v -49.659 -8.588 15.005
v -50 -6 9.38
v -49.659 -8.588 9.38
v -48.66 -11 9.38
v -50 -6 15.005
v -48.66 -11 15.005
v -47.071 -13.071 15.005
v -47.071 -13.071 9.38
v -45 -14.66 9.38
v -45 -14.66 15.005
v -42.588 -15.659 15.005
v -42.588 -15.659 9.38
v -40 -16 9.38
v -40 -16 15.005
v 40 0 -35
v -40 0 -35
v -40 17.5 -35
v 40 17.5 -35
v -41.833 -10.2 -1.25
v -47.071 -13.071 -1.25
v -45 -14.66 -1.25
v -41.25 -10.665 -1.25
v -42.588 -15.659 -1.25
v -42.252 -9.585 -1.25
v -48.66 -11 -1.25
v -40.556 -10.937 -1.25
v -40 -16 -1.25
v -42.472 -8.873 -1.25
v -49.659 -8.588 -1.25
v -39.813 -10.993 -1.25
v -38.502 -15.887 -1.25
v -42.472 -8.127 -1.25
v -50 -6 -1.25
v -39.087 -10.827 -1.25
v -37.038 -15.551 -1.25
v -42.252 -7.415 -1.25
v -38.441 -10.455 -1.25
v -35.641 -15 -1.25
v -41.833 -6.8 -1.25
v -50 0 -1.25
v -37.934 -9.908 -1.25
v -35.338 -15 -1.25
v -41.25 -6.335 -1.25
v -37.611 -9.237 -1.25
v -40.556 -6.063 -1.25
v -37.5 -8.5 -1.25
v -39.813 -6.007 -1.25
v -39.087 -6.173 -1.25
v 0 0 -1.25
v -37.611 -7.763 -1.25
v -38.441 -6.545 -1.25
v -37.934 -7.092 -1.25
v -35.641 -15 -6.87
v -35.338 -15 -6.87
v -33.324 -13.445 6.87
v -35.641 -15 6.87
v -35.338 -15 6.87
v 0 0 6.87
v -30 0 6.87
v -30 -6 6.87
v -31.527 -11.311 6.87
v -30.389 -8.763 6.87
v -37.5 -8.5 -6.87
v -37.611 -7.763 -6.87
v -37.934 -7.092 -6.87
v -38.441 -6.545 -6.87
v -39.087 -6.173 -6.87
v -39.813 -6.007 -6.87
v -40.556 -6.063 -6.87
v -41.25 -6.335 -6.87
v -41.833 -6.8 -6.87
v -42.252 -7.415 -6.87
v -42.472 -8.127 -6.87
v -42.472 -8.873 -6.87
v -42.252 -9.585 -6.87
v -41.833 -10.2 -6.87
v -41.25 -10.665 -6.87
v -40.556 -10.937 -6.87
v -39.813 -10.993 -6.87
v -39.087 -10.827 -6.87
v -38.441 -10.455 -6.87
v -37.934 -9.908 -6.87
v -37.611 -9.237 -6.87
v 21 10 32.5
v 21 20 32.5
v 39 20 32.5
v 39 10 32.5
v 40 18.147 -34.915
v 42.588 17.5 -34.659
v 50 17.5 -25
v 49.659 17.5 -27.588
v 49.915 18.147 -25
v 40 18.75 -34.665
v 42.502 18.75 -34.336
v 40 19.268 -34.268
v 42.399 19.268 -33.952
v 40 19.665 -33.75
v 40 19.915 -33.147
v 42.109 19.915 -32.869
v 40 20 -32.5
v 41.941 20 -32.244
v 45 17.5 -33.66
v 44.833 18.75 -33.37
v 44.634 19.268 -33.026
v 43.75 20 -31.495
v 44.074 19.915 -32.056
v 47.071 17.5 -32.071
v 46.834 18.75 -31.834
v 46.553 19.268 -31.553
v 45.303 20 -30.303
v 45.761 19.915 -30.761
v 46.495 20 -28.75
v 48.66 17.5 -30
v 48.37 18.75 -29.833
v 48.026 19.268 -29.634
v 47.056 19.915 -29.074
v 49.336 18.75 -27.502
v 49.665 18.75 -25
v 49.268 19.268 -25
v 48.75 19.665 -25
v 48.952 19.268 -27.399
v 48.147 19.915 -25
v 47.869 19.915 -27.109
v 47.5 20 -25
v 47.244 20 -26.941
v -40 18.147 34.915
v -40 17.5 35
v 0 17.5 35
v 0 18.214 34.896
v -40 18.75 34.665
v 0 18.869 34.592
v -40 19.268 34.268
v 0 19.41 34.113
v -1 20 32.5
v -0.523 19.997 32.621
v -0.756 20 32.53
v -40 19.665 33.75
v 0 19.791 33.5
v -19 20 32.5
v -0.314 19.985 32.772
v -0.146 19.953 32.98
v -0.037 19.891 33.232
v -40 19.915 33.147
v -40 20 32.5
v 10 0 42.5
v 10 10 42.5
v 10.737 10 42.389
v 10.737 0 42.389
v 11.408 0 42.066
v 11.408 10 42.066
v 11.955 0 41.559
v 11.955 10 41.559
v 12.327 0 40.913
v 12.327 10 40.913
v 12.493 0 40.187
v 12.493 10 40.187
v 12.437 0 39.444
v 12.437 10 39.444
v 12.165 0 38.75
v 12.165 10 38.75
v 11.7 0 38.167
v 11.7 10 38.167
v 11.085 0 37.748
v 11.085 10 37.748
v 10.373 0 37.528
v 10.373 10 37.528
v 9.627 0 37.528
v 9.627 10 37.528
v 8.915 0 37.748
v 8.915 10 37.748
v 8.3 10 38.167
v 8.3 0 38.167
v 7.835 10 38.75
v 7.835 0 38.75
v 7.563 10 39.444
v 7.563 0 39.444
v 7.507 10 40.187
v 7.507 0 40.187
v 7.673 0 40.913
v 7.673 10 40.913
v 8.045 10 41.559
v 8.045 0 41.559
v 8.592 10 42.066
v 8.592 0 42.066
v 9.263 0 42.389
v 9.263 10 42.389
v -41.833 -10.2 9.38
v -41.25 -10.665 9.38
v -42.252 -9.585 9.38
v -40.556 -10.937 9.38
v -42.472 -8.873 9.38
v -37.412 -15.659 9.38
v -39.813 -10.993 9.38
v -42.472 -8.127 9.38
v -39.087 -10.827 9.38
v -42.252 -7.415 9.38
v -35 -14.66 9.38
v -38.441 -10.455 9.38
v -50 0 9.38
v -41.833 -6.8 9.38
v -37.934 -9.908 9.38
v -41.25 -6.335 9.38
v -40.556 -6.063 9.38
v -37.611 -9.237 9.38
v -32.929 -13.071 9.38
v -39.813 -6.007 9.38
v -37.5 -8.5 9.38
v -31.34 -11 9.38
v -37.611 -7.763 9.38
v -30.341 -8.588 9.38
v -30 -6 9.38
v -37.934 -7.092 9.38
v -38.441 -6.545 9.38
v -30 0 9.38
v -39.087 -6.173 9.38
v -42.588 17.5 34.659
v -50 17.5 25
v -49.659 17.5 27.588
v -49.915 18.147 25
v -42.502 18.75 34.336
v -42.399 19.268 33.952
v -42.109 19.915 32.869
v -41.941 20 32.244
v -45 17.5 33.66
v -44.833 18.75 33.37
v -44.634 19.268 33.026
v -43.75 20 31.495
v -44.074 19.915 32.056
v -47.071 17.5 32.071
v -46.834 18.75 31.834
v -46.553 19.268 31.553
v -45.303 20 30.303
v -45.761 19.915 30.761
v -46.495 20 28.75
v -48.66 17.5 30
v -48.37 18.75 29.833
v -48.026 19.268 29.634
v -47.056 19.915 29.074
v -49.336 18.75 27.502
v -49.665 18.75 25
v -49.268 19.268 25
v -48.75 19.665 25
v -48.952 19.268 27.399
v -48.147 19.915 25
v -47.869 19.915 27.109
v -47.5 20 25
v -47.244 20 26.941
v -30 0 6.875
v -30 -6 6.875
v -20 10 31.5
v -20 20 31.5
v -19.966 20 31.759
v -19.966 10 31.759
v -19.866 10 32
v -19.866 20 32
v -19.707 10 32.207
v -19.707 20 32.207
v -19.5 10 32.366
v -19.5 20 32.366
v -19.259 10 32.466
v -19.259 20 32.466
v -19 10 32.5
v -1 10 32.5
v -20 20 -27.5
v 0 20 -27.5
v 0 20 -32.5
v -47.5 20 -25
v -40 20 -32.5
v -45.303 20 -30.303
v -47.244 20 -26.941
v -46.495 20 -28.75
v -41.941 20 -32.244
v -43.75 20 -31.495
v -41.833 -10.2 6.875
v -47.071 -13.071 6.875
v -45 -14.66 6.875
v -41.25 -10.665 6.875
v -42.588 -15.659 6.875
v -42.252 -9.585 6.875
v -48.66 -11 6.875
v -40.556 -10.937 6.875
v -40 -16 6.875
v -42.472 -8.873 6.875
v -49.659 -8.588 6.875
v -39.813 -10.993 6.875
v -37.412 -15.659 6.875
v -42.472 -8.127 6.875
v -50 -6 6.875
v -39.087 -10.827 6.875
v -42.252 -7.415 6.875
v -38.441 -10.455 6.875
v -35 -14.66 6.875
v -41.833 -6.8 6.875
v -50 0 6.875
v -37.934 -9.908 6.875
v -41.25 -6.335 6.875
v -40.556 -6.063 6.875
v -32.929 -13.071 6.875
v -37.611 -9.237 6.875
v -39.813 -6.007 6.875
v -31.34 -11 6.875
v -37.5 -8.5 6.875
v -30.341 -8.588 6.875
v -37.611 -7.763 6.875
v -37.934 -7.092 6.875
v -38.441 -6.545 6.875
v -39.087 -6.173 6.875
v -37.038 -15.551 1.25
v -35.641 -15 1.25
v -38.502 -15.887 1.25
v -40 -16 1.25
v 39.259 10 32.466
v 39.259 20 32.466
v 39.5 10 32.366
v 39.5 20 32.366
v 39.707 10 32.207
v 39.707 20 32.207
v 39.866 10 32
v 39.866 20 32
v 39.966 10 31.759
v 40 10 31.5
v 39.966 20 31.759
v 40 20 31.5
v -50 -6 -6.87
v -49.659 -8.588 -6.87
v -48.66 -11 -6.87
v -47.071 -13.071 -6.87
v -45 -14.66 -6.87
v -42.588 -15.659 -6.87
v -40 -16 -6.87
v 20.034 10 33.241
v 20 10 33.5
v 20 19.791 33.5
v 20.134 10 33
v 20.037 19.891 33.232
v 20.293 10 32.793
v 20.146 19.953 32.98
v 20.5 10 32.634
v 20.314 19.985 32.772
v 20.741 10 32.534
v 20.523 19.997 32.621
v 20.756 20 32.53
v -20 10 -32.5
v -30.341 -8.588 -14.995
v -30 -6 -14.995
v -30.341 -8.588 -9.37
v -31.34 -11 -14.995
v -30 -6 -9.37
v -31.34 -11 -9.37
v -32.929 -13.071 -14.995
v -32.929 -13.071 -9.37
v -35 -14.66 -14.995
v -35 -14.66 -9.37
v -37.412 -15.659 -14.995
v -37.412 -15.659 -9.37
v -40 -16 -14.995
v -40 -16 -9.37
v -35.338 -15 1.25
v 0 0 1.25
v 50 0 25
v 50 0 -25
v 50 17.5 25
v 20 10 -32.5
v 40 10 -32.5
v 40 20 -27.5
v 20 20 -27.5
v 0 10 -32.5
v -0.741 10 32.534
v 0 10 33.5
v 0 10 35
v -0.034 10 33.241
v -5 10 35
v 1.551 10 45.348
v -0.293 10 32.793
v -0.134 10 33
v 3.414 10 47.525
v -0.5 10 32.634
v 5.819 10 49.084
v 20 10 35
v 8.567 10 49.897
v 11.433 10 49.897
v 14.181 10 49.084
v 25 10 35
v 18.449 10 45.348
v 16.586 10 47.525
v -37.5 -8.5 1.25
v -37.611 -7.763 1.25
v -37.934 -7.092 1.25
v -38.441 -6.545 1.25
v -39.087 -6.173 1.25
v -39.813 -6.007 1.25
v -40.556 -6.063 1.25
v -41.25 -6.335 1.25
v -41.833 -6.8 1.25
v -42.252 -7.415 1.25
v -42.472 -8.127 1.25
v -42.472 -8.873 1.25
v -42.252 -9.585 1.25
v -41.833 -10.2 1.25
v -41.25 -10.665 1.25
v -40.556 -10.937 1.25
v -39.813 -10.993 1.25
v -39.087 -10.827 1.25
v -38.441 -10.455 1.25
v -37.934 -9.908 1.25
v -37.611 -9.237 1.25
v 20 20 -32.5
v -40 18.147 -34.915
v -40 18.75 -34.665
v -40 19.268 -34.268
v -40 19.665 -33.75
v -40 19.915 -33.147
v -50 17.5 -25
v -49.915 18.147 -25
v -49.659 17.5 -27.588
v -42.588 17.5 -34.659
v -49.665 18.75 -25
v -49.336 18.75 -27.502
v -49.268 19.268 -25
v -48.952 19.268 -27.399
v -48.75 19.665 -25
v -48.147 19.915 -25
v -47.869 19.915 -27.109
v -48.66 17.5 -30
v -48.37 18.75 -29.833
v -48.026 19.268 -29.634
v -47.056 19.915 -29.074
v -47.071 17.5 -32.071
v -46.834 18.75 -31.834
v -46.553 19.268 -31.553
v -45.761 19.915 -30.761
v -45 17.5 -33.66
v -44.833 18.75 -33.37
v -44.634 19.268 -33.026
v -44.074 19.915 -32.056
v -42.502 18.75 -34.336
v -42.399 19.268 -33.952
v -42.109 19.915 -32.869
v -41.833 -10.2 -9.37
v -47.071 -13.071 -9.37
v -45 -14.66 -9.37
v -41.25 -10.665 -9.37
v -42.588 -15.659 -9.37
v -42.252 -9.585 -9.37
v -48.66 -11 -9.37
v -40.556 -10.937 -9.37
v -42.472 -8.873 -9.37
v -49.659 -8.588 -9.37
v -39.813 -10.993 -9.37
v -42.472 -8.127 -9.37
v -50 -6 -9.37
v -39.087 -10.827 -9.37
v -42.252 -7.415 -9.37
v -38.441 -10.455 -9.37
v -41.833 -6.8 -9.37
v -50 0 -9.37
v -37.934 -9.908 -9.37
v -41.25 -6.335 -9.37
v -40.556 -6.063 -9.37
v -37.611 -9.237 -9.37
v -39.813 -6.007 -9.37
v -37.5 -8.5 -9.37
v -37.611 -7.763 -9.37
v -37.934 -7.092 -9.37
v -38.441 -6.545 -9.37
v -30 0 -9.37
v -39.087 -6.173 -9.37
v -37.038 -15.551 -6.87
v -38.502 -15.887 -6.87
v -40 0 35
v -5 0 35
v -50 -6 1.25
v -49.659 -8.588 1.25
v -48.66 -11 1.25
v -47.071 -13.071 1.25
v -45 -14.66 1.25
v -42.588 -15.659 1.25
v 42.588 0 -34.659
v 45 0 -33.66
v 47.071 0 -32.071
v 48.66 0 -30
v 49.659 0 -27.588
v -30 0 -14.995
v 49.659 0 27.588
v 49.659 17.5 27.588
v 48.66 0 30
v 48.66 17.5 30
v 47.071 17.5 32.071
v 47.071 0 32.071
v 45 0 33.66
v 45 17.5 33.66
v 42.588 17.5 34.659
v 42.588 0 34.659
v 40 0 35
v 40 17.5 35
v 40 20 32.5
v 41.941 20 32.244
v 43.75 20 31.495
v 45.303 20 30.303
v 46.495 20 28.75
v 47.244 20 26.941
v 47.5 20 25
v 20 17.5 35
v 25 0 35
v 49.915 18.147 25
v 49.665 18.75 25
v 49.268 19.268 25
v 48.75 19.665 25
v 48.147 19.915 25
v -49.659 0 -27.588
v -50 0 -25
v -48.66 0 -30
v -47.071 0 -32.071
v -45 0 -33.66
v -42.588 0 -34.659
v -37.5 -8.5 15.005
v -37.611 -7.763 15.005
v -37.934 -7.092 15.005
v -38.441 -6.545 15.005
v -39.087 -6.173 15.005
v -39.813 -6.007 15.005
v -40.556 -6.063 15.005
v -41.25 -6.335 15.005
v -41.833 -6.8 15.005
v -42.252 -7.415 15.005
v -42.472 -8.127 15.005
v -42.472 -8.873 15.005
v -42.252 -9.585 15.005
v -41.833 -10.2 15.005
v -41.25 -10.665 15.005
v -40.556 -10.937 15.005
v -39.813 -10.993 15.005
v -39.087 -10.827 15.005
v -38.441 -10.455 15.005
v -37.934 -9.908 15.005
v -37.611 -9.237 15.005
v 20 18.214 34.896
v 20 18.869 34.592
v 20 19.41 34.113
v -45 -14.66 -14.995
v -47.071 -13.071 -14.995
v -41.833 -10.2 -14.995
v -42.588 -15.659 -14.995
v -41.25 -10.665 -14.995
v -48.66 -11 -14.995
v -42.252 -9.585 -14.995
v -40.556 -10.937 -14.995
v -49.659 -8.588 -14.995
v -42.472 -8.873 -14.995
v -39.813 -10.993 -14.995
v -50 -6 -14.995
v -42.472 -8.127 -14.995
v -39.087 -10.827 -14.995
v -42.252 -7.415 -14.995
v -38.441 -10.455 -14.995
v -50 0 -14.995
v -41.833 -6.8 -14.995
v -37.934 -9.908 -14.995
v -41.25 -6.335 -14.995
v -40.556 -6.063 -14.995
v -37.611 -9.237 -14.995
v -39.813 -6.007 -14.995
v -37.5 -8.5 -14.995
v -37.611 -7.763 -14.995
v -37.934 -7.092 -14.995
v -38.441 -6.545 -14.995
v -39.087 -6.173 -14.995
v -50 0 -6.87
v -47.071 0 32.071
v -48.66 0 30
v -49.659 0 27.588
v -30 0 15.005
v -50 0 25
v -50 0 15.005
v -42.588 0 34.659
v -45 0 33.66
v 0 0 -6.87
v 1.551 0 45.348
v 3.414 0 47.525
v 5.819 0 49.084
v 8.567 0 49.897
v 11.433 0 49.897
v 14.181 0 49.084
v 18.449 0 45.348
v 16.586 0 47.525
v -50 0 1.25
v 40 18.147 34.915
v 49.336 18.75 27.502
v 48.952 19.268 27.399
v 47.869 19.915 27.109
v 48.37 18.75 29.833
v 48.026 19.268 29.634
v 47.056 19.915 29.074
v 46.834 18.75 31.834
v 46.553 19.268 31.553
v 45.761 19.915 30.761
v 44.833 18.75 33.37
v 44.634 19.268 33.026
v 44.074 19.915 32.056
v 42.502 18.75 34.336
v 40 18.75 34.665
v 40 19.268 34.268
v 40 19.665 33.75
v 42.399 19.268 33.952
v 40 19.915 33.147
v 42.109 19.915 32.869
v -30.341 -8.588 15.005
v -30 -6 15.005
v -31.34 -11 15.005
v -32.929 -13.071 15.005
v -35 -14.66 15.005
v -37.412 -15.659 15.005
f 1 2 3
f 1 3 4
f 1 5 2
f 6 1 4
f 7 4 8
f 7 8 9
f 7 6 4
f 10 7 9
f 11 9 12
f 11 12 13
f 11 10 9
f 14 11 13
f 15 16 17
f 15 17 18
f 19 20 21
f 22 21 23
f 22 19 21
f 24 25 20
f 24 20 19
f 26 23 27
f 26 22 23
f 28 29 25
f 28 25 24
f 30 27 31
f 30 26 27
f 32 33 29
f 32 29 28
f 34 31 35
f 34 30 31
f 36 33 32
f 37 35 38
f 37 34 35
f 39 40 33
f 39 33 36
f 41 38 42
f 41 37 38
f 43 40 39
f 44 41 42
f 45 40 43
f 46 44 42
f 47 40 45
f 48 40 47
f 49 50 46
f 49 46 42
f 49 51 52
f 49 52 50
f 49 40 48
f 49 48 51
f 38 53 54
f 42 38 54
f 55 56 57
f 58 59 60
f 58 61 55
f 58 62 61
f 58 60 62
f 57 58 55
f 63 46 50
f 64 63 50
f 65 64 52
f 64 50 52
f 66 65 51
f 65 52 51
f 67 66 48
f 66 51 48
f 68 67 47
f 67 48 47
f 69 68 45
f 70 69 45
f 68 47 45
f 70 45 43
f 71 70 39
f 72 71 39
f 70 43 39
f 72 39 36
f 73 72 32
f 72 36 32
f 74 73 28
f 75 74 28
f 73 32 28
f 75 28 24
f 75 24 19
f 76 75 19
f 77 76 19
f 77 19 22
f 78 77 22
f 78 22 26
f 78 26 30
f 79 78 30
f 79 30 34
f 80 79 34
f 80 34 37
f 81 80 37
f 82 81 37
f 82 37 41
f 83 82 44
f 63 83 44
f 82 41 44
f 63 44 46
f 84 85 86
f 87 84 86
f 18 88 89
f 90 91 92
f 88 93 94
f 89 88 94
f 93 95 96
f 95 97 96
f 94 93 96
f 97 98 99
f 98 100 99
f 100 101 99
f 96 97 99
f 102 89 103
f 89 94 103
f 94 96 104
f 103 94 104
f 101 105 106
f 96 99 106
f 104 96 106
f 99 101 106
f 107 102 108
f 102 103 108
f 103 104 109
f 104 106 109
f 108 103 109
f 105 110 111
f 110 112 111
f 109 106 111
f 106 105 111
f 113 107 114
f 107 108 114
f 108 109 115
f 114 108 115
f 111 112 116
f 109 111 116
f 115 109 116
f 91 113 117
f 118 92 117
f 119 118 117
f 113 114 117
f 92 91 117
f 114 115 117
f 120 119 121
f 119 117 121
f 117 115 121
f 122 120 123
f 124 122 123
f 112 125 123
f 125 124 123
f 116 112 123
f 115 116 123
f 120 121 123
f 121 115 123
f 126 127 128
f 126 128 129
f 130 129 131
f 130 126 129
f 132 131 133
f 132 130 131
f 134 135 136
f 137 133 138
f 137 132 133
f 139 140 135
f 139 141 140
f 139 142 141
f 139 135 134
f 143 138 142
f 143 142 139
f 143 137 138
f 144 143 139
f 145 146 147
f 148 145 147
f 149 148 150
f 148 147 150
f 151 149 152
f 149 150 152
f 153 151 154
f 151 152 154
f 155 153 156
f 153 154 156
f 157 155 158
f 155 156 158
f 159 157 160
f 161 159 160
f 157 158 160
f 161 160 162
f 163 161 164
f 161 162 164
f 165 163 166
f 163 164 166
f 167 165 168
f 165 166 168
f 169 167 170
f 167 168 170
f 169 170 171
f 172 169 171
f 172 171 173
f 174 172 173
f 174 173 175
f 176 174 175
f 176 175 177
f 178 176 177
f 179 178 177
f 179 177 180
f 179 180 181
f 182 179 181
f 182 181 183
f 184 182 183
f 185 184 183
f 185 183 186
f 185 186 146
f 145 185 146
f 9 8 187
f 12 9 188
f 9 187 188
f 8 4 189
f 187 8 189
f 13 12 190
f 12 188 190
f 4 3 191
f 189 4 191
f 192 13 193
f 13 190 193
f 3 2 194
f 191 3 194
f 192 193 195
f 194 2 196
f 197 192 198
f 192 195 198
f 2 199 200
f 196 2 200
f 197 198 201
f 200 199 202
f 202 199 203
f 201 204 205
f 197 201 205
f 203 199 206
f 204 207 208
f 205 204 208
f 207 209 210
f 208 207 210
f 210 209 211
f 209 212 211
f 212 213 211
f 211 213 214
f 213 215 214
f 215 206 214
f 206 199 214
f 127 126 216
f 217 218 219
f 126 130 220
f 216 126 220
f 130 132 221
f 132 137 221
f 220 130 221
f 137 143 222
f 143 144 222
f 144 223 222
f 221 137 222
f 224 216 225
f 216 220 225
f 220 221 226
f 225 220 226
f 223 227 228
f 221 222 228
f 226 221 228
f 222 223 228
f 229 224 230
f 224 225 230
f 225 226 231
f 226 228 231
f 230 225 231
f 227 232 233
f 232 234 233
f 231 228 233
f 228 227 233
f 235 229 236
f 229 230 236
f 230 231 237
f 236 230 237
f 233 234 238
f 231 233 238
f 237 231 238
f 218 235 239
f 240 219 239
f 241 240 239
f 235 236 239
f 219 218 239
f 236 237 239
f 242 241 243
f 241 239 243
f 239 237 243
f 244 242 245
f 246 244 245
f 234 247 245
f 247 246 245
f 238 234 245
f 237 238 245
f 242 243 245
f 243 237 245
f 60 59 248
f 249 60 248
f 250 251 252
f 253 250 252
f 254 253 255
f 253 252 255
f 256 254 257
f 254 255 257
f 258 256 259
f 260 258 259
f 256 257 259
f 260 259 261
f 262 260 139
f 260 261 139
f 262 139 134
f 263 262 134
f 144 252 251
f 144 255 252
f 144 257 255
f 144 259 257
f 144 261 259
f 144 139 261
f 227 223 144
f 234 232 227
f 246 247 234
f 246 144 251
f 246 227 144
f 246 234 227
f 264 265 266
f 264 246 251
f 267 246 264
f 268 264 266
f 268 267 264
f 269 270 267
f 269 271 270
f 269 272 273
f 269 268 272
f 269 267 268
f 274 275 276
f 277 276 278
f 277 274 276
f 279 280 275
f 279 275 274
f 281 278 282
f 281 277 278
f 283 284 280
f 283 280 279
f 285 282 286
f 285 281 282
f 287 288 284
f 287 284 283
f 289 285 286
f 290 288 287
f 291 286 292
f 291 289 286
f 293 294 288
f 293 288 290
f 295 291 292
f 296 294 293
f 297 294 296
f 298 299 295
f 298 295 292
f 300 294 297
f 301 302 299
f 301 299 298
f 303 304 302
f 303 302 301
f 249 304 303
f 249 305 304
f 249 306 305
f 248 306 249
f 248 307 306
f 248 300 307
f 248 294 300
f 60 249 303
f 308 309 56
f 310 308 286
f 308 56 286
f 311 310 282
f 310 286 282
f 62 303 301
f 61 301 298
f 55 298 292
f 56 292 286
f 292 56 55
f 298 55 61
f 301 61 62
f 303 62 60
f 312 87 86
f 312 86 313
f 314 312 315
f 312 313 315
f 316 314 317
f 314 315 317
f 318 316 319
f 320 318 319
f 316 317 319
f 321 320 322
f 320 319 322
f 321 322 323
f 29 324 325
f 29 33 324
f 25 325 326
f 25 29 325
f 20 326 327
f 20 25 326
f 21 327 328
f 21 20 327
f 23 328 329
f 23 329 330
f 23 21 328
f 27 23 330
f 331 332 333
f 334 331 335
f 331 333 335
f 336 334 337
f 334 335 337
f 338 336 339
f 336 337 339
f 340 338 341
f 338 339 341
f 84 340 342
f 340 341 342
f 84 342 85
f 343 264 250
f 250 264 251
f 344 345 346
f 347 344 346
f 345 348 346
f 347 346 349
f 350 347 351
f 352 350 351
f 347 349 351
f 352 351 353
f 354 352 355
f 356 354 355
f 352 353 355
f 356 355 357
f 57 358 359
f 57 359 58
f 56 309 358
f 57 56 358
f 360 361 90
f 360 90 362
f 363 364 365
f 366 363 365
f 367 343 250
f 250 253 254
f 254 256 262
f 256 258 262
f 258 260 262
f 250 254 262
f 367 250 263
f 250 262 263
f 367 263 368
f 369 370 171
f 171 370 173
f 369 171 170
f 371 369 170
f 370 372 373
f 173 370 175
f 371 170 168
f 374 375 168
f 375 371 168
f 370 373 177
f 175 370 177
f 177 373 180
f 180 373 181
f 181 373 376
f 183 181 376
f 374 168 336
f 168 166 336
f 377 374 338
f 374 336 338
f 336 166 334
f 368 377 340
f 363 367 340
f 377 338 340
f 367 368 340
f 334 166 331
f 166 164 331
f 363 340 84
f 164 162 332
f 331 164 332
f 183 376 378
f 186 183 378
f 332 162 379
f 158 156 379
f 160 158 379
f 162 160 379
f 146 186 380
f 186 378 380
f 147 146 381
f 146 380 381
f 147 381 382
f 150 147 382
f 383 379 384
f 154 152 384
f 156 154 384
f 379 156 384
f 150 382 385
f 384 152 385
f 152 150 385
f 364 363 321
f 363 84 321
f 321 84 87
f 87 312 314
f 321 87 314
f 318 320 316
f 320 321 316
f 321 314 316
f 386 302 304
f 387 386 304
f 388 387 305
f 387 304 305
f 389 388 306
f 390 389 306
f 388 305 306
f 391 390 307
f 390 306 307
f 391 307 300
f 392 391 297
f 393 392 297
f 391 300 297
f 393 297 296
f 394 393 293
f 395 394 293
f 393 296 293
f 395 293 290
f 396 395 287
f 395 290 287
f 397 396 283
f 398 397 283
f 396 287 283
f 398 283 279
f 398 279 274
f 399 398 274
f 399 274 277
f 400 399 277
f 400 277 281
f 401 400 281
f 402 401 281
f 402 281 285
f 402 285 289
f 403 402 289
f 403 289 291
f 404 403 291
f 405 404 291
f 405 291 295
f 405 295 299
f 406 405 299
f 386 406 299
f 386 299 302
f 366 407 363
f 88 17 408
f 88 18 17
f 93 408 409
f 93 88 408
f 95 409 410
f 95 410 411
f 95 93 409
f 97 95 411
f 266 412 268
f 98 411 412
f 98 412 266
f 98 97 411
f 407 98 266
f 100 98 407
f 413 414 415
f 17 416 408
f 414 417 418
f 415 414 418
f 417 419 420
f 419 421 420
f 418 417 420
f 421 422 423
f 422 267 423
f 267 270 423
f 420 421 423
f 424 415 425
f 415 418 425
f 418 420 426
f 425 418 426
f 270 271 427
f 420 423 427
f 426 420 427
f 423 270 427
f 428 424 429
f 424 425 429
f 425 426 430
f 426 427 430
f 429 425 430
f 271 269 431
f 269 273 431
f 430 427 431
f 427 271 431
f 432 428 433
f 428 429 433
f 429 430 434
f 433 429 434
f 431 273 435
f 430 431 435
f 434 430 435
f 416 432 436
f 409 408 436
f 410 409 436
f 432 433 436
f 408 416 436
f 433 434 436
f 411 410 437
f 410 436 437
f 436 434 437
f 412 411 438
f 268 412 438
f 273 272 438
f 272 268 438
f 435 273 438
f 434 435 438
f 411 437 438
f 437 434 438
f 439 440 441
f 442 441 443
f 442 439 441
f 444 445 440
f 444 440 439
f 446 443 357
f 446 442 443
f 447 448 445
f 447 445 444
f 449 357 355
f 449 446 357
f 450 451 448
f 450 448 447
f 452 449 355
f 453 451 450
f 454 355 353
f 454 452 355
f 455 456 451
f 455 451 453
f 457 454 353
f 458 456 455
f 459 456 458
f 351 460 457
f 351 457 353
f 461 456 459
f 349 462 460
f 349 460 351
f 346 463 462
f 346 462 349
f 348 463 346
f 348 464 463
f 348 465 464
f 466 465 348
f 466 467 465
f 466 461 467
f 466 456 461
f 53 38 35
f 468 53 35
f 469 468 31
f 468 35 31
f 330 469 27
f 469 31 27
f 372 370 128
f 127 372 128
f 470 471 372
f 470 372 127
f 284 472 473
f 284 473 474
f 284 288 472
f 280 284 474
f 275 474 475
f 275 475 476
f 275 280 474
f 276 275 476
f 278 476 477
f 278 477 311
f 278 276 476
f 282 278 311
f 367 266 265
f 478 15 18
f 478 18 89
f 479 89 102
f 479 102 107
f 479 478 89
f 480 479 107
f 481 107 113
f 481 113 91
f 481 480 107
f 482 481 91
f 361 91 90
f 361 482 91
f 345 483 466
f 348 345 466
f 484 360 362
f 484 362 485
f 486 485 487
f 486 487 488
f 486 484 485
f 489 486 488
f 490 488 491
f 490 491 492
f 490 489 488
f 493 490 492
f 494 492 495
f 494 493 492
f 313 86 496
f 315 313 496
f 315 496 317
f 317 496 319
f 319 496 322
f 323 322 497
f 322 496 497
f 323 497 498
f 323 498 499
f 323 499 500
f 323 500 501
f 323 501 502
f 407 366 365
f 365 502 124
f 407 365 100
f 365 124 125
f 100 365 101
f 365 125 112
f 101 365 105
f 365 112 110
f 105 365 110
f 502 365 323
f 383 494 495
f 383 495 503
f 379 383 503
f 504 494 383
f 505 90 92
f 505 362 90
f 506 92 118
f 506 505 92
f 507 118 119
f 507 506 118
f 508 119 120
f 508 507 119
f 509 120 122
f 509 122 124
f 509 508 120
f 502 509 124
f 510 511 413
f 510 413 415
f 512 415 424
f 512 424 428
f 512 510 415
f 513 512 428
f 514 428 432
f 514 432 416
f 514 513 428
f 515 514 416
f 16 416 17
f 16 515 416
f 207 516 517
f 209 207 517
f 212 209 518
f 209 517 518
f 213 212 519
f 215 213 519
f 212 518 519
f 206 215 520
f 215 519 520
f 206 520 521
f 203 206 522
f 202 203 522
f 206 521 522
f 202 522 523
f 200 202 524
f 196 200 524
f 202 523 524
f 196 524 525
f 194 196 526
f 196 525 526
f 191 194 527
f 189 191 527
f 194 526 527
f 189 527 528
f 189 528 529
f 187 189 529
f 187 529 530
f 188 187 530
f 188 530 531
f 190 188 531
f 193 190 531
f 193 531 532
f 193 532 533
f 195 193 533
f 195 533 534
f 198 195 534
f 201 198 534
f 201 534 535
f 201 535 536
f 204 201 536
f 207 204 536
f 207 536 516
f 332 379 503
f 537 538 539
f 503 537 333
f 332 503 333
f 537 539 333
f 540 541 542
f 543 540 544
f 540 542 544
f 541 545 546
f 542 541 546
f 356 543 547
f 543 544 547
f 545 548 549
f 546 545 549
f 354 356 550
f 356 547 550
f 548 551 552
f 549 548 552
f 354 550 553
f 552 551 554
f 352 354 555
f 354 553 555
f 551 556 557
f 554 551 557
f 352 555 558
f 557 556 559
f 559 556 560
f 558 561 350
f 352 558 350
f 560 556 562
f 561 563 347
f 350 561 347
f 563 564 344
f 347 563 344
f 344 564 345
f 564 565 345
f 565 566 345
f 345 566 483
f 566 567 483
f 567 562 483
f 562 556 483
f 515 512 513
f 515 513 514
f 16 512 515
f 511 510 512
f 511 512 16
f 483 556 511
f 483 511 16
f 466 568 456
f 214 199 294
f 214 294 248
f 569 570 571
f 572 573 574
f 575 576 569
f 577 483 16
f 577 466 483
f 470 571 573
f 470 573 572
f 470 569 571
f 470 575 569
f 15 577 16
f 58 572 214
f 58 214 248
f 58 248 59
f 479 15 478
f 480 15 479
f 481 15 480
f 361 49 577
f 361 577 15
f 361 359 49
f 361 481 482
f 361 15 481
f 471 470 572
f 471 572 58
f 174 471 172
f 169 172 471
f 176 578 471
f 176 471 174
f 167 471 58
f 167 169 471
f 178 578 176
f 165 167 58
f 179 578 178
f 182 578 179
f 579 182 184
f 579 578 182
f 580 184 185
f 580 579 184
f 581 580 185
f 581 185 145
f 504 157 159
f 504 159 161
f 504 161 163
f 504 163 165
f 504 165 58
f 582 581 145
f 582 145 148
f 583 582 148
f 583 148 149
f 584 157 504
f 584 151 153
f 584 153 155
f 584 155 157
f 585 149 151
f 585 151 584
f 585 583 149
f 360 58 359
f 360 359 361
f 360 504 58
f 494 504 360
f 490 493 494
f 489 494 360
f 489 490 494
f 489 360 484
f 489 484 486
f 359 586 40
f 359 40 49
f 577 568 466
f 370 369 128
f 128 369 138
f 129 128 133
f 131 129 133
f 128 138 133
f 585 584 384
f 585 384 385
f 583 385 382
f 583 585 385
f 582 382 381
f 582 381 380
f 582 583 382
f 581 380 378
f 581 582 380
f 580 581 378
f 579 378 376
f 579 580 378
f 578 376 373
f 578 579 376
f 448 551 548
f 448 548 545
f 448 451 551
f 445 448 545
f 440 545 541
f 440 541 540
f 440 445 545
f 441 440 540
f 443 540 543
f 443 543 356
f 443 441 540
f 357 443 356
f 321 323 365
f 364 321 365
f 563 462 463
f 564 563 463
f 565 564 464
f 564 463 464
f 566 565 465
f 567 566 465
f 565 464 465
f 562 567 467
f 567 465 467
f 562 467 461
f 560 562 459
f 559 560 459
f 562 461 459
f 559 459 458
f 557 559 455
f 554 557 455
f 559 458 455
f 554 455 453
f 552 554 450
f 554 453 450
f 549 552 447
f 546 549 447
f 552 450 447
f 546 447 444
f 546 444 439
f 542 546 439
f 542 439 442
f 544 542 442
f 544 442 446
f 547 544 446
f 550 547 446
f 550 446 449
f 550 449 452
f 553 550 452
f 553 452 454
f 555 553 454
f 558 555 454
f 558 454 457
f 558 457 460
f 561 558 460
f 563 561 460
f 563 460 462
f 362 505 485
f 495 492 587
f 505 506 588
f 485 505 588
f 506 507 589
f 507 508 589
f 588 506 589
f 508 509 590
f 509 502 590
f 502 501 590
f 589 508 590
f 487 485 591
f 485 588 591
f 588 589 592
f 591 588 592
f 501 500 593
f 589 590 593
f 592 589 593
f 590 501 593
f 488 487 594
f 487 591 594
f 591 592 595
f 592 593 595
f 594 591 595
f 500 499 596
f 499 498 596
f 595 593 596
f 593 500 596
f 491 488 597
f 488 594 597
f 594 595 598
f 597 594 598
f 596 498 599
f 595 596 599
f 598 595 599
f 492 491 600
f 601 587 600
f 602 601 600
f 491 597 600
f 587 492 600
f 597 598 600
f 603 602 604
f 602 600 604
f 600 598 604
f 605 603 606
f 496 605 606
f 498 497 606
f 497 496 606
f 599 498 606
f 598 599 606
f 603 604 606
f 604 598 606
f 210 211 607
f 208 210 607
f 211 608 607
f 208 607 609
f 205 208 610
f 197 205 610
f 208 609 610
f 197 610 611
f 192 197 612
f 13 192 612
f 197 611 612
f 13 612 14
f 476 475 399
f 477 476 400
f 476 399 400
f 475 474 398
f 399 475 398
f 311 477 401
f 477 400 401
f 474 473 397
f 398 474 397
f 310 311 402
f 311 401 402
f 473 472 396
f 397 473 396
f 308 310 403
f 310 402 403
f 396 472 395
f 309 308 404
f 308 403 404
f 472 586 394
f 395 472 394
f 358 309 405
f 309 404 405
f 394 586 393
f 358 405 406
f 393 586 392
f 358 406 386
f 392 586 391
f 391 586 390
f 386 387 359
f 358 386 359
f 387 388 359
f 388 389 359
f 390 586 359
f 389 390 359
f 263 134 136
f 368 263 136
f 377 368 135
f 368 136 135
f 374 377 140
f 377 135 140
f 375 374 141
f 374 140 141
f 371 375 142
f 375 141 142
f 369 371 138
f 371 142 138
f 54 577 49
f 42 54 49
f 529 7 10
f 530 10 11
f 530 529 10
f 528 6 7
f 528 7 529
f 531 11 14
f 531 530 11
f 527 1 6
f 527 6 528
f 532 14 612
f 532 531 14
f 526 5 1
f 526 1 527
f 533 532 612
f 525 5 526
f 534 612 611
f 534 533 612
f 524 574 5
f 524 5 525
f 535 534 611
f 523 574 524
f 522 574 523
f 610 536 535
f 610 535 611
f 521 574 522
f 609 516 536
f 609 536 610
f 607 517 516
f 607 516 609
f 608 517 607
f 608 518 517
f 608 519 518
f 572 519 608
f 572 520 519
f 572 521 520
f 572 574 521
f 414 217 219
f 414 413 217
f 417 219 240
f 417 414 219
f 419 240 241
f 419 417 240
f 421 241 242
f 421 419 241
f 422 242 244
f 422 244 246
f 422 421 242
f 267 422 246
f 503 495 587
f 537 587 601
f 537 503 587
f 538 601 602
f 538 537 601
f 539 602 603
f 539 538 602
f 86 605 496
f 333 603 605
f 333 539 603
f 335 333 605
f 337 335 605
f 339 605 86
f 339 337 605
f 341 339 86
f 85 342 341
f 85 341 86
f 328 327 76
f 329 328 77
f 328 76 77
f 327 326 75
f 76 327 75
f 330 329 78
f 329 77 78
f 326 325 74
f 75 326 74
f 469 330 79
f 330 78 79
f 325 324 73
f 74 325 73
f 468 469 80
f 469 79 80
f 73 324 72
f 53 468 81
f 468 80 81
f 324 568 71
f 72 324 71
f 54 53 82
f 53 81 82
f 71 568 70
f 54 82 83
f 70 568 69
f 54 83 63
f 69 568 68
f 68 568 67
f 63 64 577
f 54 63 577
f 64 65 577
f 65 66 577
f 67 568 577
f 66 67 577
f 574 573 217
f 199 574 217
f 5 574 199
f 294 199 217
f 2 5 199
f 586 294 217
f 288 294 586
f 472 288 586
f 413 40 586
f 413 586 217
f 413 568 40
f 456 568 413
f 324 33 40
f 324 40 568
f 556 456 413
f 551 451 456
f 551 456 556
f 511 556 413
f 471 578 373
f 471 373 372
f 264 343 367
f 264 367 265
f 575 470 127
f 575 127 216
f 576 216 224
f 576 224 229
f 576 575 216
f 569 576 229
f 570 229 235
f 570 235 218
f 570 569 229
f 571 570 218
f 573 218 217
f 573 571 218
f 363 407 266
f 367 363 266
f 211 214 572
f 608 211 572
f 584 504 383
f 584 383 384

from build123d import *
from OCP.BRepFilletAPI import BRepFilletAPI_MakeChamfer

# Parameters (mm, degrees)
BOSS_EXTRUDE1_DEPTH = 20
FILLET1_R           = 2.5
SKETCH3_W           = 20
SKETCH3_H           = 5.625
SKETCH3_H_2         = 5.62
BOSS_EXTRUDE2_DEPTH = 16
FILLET2_R           = 10
SKETCH4_R           = 2.5
CUT_EXTRUDE1_DEPTH  = 74.488094444
SKETCH5_W           = 40
SKETCH5_H           = 5.62
BOSS_EXTRUDE3_DEPTH = 15
CHAMFER1_SIZE       = 35.337785487
CHAMFER1_SIZE_2     = 15
SKETCH6_R           = 2.5
CUT_EXTRUDE2_DEPTH  = 74.488094444
CUT_EXTRUDE3_DEPTH  = 10
BOSS_EXTRUDE4_DEPTH = 20
BOSS_EXTRUDE5_DEPTH = 20
BOSS_EXTRUDE6_DEPTH = 10
SKETCH12_R          = 2.5
CUT_EXTRUDE5_DEPTH  = 15


with BuildPart() as part:
    # Sketch1 → Boss-Extrude1 (new body)
    with BuildSketch(Plane(origin=(0, 0, 0), x_dir=(1, 0, 0), z_dir=(0, 1, 0))):
        with BuildLine():
            Line((40, -35), (-40, -35))
            ThreePointArc((-40, -35), (-47.071067812, -32.071067812), (-50, -25))
            Line((-50, -25), (-50, 25))
            ThreePointArc((-50, 25), (-47.071067812, 32.071067812), (-40, 35))
            Line((-40, 35), (40, 35))
            ThreePointArc((40, 35), (47.071067812, 32.071067812), (50, 25))
            Line((50, 25), (50, -25))
            ThreePointArc((50, -25), (47.071067812, -32.071067812), (40, -35))
        make_face()
    extrude(amount=BOSS_EXTRUDE1_DEPTH)

    # Fillet1
    fillet1_edges = [part.edges().sort_by_distance(p)[0] for p in [
        (-47.071067812, 20, 32.071067812),
        (0, 20, 35),
        (47.071067812, 20, 32.071067812),
        (50, 20, 0),
        (47.071067812, 20, -32.071067812),
        (0, 20, -35),
        (-47.071067812, 20, -32.071067812),
        (-50, 20, 0),
    ]]
    fillet(fillet1_edges, radius=FILLET1_R)

    # Sketch3 → Boss-Extrude2 (add)
    with BuildSketch(Plane.XZ):
        with Locations((-40, 4.0625)):
            Rectangle(SKETCH3_W, SKETCH3_H)
        with Locations((-40, 12.1925)):
            Rectangle(SKETCH3_W, SKETCH3_H)
        with Locations((-40, -12.1825)):
            Rectangle(SKETCH3_W, SKETCH3_H)
        with Locations((-40, -4.06)):
            Rectangle(SKETCH3_W, SKETCH3_H_2)
    extrude(amount=BOSS_EXTRUDE2_DEPTH)

    # Fillet2
    fillet2_edges = [part.edges().sort_by_distance(p)[0] for p in [
        (-30, -16, -12.1825),
        (-30, -16, -4.06),
        (-30, -16, 4.0625),
        (-30, -16, 12.1925),
        (-50, -16, -12.1825),
        (-50, -16, -4.06),
        (-50, -16, 4.0625),
        (-50, -16, 12.1925),
    ]]
    fillet(fillet2_edges, radius=FILLET2_R - 0.0001)  # a hair under: the kernel refuses the full size

    # Sketch4 → Cut-Extrude1 (cut, through all)
    with BuildSketch(Plane.XY.offset(15.005)):
        with Locations((-40, -8.5)):
            Circle(SKETCH4_R)
    extrude(amount=-CUT_EXTRUDE1_DEPTH, mode=Mode.SUBTRACT)

    # Sketch5 → Boss-Extrude3 (add)
    with BuildSketch(Plane.XZ):
        with Locations((-20, 4.06)):
            Rectangle(SKETCH5_W, SKETCH5_H)
        with Locations((-20, -4.06)):
            Rectangle(SKETCH5_W, SKETCH5_H)
    extrude(amount=BOSS_EXTRUDE3_DEPTH)

    # Chamfer1
    chamfer1_edges_1 = [part.edges().sort_by_distance(p)[0] for p in [
        (0, -15, -4.06),
    ]]
    chamfer1_side_1 = [part.faces().sort_by_distance(p)[0] for p in [
        (-0.3, -15, -4.06),
    ]]
    chamfer1_edges_2 = [part.edges().sort_by_distance(p)[0] for p in [
        (0, -15, 4.06),
    ]]
    chamfer1_side_2 = [part.faces().sort_by_distance(p)[0] for p in [
        (0, -14.7, 4.06),
    ]]
    chamfer1 = BRepFilletAPI_MakeChamfer(part.part.solid().wrapped)
    for e in chamfer1_edges_1:
        chamfer1.Add(CHAMFER1_SIZE - 0.0001, CHAMFER1_SIZE_2 - 0.0001, e.wrapped, chamfer1_side_1[0].wrapped)
    for e in chamfer1_edges_2:
        chamfer1.Add(CHAMFER1_SIZE_2 - 0.0001, CHAMFER1_SIZE - 0.0001, e.wrapped, chamfer1_side_2[0].wrapped)
    add(Compound.cast(chamfer1.Shape()), mode=Mode.REPLACE)  # a hair under: the kernel refuses the full size

    # Sketch6 → Cut-Extrude2 (cut, through all)
    with BuildSketch(Plane.XY.offset(15.005)):
        with Locations((-40, -8.5)):
            Circle(SKETCH6_R)
    extrude(amount=-CUT_EXTRUDE2_DEPTH, mode=Mode.SUBTRACT)

    # Sketch7 → Cut-Extrude3 (cut)
    with BuildSketch(Plane(origin=(0, 20, 0), x_dir=(1, 0, 0), z_dir=(0, 1, 0))):
        with BuildLine():
            Line((0, -33.5), (0, -42.5))
            Line((0, -42.5), (20, -42.5))
            Line((20, -42.5), (20, -33.5))
            ThreePointArc((20, -33.5), (20.292893219, -32.792893219), (21, -32.5))
            Line((21, -32.5), (39, -32.5))
            ThreePointArc((39, -32.5), (39.707106781, -32.207106781), (40, -31.5))
            Line((40, -31.5), (40, 32.5))
            Line((40, 32.5), (-20, 32.5))
            Line((-20, 32.5), (-20, -31.5))
            ThreePointArc((-20, -31.5), (-19.707106781, -32.207106781), (-19, -32.5))
            Line((-19, -32.5), (-1, -32.5))
            ThreePointArc((-1, -32.5), (-0.292893219, -32.792893219), (0, -33.5))
        make_face()
    extrude(amount=-CUT_EXTRUDE3_DEPTH, mode=Mode.SUBTRACT)

    # Sketch8 → Boss-Extrude4 (add)
    with BuildSketch(Plane(origin=(-20, 0, 0), x_dir=(0, 0, -1), z_dir=(1, 0, 0))):
        Polygon((32.5, 10), (27.5, 20), (32.5, 20), align=None)
    extrude(amount=BOSS_EXTRUDE4_DEPTH)

    # Sketch9 → Boss-Extrude5 (add)
    with BuildSketch(Plane.ZY.offset(-40)):
        Polygon((-32.5, 10), (-27.5, 20), (-32.5, 20), align=None)
    extrude(amount=BOSS_EXTRUDE5_DEPTH)

    # Sketch10 → Boss-Extrude6 (add)
    with BuildSketch(Plane.XZ):
        with BuildLine():
            Line((-5, 35), (25, 35))
            Line((25, 35), (18.449489743, 45.348469228))
            ThreePointArc((18.449489743, 45.348469228), (10, 50), (1.550510257, 45.348469228))
            Line((1.550510257, 45.348469228), (-5, 35))
        make_face()
    extrude(amount=-BOSS_EXTRUDE6_DEPTH)

    # Sketch12 → Cut-Extrude5 (cut)
    with BuildSketch(Plane(origin=(0, 10, 0), x_dir=(1, 0, 0), z_dir=(0, 1, 0))):
        with Locations(Location((10, -40, 0), (0, 0, 270))):
            Circle(SKETCH12_R)
    extrude(amount=-CUT_EXTRUDE5_DEPTH, mode=Mode.SUBTRACT)


solid = part.part
